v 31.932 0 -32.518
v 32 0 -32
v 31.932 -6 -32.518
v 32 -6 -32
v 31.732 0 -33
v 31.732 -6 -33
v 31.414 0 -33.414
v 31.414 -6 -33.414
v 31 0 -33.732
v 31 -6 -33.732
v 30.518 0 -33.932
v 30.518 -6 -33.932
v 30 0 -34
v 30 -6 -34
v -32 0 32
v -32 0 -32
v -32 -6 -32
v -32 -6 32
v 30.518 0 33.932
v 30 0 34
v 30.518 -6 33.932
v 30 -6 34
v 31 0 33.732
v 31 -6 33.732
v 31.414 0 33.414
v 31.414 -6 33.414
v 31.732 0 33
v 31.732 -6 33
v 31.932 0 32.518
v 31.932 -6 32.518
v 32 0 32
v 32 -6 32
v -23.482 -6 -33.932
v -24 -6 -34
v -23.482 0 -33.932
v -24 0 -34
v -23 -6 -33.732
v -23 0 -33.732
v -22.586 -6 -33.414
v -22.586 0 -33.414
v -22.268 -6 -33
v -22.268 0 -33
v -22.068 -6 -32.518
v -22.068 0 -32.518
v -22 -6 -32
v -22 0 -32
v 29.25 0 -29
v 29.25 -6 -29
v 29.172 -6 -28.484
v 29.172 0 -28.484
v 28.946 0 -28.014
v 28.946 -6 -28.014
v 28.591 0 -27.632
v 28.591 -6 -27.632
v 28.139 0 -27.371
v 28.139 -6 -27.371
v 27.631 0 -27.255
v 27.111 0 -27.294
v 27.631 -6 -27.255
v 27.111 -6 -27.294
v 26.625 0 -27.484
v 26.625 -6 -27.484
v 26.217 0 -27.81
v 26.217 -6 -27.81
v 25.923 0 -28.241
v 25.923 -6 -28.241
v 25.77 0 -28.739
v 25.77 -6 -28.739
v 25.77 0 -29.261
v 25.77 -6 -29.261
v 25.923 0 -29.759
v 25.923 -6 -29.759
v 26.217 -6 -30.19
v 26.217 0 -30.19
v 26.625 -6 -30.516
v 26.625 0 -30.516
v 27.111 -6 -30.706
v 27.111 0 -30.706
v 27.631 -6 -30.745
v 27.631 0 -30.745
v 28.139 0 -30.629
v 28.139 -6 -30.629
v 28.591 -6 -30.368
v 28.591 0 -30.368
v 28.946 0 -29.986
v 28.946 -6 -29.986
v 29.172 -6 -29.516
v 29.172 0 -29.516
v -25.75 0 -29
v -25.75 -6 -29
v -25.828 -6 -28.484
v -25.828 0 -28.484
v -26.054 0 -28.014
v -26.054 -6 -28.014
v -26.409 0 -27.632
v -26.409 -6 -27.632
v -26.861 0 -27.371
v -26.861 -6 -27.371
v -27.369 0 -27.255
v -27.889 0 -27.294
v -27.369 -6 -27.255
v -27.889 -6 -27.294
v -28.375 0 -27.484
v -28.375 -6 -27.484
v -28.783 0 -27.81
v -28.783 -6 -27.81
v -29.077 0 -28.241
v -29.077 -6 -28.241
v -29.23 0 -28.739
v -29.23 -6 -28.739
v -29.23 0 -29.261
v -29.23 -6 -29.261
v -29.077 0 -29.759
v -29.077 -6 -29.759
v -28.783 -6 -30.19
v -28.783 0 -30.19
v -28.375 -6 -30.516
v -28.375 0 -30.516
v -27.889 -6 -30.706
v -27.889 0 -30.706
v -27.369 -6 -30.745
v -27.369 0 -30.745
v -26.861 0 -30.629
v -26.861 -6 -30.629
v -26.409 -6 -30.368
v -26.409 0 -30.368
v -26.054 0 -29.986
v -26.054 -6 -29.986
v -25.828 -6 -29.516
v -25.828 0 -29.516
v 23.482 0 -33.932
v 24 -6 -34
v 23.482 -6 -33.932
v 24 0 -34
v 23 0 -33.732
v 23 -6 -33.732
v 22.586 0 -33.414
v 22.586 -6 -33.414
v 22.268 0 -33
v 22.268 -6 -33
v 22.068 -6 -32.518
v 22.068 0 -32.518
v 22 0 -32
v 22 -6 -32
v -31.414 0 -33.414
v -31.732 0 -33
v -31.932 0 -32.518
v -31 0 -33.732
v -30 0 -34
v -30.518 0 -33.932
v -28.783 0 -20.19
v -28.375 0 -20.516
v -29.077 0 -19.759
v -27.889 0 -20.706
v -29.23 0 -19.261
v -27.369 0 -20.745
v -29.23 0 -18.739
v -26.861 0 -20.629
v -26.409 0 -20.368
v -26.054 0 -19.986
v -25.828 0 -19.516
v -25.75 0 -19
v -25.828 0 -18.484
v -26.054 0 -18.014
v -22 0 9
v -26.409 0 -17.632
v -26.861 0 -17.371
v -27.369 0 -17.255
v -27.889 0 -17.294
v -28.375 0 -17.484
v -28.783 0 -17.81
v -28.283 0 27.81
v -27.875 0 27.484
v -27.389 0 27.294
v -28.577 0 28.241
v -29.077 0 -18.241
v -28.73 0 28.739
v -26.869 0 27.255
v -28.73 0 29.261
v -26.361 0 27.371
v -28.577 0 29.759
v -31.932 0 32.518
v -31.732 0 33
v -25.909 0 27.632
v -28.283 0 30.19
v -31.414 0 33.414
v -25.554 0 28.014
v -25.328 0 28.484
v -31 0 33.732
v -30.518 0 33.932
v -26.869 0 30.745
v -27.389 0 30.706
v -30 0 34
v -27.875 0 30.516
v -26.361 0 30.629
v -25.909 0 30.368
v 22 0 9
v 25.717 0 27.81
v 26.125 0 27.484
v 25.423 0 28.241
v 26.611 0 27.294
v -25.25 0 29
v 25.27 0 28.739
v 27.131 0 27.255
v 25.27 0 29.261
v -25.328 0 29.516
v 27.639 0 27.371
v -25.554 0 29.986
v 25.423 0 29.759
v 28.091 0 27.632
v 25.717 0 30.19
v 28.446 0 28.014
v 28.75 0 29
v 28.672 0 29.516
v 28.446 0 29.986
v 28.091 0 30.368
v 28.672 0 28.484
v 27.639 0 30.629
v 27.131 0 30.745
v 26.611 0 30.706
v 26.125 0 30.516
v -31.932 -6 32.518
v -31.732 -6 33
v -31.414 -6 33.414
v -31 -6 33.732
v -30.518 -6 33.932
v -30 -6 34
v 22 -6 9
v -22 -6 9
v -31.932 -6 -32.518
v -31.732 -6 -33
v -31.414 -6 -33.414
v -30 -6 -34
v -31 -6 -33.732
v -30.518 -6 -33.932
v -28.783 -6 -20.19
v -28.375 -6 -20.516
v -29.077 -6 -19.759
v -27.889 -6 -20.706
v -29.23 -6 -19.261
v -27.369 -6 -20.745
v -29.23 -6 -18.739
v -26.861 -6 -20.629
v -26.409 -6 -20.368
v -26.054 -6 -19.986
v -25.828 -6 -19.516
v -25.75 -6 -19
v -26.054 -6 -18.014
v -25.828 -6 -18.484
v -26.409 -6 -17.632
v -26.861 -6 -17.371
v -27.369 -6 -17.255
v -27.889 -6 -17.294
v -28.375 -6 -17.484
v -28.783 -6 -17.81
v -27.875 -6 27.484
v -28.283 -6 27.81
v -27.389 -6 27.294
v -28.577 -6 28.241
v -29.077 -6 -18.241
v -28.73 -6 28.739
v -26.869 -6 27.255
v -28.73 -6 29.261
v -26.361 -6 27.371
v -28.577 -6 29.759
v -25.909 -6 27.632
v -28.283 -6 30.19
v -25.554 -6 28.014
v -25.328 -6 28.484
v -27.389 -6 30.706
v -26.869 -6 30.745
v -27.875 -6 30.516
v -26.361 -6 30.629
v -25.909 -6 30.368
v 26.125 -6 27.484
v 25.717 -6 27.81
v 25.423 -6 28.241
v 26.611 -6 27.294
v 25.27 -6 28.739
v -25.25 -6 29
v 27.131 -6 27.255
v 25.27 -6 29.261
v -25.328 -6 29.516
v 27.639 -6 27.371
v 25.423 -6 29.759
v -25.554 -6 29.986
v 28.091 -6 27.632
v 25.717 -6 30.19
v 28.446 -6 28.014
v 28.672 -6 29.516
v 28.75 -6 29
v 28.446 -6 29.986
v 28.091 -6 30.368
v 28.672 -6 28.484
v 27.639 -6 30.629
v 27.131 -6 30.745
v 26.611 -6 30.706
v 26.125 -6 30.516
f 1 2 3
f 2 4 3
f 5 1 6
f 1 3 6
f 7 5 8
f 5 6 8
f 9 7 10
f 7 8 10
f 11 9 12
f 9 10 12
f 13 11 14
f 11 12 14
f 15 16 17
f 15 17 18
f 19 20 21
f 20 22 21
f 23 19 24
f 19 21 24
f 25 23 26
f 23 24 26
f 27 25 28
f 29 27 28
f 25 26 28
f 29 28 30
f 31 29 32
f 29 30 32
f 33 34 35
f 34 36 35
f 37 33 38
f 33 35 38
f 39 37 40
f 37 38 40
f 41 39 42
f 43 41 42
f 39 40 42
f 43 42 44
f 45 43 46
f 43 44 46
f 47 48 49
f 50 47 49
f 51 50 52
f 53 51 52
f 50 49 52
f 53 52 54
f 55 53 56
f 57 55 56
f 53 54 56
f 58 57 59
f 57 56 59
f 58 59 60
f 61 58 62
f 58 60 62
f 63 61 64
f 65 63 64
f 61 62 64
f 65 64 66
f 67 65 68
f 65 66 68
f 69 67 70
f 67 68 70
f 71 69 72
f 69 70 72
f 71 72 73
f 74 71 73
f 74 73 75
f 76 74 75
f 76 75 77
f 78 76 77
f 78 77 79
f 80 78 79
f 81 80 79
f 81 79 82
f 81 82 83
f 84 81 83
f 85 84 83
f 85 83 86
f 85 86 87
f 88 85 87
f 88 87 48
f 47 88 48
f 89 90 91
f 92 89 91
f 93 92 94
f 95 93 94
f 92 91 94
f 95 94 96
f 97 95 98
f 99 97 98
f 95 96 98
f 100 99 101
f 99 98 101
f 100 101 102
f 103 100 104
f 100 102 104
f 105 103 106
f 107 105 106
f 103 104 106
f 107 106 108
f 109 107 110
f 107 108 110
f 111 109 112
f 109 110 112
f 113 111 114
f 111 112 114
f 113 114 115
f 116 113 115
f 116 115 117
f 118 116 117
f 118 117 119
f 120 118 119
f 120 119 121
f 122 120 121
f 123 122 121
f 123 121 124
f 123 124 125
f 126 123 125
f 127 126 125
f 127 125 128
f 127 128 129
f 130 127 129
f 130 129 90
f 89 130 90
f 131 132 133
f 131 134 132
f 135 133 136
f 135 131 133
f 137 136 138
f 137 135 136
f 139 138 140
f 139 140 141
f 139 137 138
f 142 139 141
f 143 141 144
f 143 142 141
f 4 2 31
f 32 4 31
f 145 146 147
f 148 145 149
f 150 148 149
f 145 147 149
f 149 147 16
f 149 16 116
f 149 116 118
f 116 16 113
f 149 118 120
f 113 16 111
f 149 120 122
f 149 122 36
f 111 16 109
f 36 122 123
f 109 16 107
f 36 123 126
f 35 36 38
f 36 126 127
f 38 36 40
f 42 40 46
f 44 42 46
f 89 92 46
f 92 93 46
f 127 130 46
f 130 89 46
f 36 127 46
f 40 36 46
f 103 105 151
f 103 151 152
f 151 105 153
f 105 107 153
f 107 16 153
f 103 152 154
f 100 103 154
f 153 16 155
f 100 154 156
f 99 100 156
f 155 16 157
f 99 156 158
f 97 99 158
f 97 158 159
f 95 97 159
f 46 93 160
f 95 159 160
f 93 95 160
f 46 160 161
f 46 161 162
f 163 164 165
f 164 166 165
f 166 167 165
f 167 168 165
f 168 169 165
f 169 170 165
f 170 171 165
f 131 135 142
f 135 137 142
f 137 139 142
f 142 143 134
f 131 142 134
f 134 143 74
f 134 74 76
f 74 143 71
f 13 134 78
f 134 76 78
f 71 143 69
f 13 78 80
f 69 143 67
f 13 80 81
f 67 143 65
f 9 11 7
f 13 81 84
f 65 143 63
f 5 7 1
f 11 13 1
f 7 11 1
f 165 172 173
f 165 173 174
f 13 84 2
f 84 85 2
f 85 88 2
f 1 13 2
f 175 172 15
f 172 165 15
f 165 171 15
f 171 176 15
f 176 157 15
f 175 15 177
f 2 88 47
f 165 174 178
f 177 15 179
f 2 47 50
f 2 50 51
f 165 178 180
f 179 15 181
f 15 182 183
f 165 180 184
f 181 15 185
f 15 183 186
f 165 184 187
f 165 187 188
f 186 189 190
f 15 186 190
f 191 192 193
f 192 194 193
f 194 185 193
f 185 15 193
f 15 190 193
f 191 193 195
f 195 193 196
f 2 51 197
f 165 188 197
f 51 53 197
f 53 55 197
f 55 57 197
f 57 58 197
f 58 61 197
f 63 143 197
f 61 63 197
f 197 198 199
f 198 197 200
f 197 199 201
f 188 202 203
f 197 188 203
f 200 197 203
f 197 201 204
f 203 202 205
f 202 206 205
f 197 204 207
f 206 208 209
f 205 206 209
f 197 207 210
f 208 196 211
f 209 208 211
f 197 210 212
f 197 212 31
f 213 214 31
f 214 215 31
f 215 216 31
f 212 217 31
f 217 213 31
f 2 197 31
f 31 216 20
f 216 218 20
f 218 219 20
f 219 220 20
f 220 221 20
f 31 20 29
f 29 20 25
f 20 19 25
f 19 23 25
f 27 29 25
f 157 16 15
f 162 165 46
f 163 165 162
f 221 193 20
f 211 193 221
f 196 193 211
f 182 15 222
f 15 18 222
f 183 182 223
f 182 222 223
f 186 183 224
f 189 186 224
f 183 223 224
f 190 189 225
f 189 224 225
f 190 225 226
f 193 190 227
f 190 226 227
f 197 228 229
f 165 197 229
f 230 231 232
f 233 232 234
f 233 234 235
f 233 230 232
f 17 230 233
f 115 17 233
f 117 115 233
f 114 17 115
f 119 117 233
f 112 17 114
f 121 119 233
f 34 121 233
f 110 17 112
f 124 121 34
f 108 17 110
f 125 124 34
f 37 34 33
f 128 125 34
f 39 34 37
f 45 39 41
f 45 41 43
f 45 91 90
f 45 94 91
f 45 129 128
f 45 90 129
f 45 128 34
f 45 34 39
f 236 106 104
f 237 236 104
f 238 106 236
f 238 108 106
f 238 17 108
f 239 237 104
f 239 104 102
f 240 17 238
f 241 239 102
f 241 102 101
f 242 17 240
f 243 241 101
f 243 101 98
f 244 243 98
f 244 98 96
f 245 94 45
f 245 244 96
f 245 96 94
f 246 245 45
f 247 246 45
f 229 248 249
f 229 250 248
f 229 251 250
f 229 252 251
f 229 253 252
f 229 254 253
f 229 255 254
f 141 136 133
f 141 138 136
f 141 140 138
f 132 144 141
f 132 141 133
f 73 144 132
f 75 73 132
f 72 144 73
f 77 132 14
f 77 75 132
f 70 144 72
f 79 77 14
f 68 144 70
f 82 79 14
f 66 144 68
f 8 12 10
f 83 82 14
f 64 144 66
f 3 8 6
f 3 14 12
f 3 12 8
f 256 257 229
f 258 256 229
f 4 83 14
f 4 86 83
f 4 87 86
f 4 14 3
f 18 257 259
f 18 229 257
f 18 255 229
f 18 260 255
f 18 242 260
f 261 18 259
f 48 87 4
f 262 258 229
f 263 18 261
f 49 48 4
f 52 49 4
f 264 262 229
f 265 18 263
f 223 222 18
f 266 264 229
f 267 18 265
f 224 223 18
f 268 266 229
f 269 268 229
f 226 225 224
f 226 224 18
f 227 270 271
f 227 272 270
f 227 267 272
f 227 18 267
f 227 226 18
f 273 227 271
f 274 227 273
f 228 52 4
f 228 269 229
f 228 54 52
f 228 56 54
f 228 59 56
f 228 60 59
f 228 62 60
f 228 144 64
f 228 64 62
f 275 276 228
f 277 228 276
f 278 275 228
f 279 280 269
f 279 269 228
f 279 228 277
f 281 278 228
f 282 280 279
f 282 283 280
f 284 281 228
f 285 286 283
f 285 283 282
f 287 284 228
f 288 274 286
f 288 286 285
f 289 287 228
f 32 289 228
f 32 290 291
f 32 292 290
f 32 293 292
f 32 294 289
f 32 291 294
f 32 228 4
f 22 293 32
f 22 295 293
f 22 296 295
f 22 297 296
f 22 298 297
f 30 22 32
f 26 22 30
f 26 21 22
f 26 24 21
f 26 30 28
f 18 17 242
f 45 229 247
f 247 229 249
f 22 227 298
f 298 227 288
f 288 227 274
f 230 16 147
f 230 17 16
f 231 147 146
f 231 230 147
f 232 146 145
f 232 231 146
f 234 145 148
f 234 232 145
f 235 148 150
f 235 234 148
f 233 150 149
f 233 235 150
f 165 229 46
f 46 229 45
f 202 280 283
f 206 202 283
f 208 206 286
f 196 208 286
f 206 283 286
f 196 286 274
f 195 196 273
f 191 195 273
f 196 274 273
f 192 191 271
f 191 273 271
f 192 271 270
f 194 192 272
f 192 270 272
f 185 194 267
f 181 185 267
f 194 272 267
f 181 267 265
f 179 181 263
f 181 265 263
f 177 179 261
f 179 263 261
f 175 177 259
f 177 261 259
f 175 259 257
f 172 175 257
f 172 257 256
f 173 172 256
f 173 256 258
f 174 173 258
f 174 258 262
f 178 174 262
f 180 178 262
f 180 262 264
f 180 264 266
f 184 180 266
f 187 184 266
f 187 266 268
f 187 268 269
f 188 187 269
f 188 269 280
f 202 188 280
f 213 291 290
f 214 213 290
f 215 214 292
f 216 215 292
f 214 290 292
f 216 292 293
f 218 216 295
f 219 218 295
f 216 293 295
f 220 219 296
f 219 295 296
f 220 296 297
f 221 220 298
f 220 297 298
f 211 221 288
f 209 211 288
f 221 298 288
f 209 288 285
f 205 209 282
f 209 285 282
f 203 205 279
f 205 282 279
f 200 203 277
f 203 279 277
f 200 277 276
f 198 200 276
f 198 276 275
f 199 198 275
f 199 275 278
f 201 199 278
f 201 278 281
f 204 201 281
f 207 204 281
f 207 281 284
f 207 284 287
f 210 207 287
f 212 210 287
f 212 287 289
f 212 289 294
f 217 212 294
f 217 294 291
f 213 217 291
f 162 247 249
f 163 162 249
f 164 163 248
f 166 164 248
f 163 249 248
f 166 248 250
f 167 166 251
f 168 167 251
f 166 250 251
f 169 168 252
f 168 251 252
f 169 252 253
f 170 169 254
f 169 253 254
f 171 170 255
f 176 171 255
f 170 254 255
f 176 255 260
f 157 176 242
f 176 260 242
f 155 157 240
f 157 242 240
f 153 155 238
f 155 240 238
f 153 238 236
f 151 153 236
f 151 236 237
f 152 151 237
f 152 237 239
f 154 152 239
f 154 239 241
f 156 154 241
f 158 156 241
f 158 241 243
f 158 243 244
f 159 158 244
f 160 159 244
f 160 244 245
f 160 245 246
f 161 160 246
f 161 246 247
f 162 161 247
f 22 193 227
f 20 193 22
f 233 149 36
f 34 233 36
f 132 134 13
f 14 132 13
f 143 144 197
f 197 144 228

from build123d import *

# Parameters (mm, degrees)
F0_W     = 64
F0_H     = 68
F1_DEPTH = 6
F2_R     = 1.75
F3_DEPTH = 25
F4_R     = 2


# Not quite as in the source:
# - a feature names something its author has since deleted; it is built from what else it names


with BuildPart() as f1:
    # F0 (on Front) → F1 (new body)
    with BuildSketch(Plane.XZ):
        Rectangle(F0_W, F0_H)
    extrude(amount=F1_DEPTH)

    # F2 (on face) → F3 (cut)
    with BuildSketch(Plane.XZ.offset(6)):
        Polygon((22, 9), (0, 9), (-22, 9), (-22, -34), (22, -34), align=None)
        with Locations((27.5, -29)):
            Circle(F2_R)
        with Locations((-27.5, -19)):
            Circle(F2_R)
        with Locations((-27.5, -29)):
            Circle(F2_R)
        with Locations((-27, 29)):
            Circle(F2_R)
        with Locations((27, 29)):
            Circle(F2_R)
    extrude(amount=-F3_DEPTH, mode=Mode.SUBTRACT)

    # F4
    f4_edges = [f1.edges().sort_by_distance(p)[0] for p in [
        (-32, -3, 34),
        (32, -3, 34),
        (-32, -3, -34),
        (32, -3, -34),
        (-22, -3, -34),
        (22, -3, -34),
    ]]
    fillet(f4_edges, radius=F4_R)


solid = f1.part
